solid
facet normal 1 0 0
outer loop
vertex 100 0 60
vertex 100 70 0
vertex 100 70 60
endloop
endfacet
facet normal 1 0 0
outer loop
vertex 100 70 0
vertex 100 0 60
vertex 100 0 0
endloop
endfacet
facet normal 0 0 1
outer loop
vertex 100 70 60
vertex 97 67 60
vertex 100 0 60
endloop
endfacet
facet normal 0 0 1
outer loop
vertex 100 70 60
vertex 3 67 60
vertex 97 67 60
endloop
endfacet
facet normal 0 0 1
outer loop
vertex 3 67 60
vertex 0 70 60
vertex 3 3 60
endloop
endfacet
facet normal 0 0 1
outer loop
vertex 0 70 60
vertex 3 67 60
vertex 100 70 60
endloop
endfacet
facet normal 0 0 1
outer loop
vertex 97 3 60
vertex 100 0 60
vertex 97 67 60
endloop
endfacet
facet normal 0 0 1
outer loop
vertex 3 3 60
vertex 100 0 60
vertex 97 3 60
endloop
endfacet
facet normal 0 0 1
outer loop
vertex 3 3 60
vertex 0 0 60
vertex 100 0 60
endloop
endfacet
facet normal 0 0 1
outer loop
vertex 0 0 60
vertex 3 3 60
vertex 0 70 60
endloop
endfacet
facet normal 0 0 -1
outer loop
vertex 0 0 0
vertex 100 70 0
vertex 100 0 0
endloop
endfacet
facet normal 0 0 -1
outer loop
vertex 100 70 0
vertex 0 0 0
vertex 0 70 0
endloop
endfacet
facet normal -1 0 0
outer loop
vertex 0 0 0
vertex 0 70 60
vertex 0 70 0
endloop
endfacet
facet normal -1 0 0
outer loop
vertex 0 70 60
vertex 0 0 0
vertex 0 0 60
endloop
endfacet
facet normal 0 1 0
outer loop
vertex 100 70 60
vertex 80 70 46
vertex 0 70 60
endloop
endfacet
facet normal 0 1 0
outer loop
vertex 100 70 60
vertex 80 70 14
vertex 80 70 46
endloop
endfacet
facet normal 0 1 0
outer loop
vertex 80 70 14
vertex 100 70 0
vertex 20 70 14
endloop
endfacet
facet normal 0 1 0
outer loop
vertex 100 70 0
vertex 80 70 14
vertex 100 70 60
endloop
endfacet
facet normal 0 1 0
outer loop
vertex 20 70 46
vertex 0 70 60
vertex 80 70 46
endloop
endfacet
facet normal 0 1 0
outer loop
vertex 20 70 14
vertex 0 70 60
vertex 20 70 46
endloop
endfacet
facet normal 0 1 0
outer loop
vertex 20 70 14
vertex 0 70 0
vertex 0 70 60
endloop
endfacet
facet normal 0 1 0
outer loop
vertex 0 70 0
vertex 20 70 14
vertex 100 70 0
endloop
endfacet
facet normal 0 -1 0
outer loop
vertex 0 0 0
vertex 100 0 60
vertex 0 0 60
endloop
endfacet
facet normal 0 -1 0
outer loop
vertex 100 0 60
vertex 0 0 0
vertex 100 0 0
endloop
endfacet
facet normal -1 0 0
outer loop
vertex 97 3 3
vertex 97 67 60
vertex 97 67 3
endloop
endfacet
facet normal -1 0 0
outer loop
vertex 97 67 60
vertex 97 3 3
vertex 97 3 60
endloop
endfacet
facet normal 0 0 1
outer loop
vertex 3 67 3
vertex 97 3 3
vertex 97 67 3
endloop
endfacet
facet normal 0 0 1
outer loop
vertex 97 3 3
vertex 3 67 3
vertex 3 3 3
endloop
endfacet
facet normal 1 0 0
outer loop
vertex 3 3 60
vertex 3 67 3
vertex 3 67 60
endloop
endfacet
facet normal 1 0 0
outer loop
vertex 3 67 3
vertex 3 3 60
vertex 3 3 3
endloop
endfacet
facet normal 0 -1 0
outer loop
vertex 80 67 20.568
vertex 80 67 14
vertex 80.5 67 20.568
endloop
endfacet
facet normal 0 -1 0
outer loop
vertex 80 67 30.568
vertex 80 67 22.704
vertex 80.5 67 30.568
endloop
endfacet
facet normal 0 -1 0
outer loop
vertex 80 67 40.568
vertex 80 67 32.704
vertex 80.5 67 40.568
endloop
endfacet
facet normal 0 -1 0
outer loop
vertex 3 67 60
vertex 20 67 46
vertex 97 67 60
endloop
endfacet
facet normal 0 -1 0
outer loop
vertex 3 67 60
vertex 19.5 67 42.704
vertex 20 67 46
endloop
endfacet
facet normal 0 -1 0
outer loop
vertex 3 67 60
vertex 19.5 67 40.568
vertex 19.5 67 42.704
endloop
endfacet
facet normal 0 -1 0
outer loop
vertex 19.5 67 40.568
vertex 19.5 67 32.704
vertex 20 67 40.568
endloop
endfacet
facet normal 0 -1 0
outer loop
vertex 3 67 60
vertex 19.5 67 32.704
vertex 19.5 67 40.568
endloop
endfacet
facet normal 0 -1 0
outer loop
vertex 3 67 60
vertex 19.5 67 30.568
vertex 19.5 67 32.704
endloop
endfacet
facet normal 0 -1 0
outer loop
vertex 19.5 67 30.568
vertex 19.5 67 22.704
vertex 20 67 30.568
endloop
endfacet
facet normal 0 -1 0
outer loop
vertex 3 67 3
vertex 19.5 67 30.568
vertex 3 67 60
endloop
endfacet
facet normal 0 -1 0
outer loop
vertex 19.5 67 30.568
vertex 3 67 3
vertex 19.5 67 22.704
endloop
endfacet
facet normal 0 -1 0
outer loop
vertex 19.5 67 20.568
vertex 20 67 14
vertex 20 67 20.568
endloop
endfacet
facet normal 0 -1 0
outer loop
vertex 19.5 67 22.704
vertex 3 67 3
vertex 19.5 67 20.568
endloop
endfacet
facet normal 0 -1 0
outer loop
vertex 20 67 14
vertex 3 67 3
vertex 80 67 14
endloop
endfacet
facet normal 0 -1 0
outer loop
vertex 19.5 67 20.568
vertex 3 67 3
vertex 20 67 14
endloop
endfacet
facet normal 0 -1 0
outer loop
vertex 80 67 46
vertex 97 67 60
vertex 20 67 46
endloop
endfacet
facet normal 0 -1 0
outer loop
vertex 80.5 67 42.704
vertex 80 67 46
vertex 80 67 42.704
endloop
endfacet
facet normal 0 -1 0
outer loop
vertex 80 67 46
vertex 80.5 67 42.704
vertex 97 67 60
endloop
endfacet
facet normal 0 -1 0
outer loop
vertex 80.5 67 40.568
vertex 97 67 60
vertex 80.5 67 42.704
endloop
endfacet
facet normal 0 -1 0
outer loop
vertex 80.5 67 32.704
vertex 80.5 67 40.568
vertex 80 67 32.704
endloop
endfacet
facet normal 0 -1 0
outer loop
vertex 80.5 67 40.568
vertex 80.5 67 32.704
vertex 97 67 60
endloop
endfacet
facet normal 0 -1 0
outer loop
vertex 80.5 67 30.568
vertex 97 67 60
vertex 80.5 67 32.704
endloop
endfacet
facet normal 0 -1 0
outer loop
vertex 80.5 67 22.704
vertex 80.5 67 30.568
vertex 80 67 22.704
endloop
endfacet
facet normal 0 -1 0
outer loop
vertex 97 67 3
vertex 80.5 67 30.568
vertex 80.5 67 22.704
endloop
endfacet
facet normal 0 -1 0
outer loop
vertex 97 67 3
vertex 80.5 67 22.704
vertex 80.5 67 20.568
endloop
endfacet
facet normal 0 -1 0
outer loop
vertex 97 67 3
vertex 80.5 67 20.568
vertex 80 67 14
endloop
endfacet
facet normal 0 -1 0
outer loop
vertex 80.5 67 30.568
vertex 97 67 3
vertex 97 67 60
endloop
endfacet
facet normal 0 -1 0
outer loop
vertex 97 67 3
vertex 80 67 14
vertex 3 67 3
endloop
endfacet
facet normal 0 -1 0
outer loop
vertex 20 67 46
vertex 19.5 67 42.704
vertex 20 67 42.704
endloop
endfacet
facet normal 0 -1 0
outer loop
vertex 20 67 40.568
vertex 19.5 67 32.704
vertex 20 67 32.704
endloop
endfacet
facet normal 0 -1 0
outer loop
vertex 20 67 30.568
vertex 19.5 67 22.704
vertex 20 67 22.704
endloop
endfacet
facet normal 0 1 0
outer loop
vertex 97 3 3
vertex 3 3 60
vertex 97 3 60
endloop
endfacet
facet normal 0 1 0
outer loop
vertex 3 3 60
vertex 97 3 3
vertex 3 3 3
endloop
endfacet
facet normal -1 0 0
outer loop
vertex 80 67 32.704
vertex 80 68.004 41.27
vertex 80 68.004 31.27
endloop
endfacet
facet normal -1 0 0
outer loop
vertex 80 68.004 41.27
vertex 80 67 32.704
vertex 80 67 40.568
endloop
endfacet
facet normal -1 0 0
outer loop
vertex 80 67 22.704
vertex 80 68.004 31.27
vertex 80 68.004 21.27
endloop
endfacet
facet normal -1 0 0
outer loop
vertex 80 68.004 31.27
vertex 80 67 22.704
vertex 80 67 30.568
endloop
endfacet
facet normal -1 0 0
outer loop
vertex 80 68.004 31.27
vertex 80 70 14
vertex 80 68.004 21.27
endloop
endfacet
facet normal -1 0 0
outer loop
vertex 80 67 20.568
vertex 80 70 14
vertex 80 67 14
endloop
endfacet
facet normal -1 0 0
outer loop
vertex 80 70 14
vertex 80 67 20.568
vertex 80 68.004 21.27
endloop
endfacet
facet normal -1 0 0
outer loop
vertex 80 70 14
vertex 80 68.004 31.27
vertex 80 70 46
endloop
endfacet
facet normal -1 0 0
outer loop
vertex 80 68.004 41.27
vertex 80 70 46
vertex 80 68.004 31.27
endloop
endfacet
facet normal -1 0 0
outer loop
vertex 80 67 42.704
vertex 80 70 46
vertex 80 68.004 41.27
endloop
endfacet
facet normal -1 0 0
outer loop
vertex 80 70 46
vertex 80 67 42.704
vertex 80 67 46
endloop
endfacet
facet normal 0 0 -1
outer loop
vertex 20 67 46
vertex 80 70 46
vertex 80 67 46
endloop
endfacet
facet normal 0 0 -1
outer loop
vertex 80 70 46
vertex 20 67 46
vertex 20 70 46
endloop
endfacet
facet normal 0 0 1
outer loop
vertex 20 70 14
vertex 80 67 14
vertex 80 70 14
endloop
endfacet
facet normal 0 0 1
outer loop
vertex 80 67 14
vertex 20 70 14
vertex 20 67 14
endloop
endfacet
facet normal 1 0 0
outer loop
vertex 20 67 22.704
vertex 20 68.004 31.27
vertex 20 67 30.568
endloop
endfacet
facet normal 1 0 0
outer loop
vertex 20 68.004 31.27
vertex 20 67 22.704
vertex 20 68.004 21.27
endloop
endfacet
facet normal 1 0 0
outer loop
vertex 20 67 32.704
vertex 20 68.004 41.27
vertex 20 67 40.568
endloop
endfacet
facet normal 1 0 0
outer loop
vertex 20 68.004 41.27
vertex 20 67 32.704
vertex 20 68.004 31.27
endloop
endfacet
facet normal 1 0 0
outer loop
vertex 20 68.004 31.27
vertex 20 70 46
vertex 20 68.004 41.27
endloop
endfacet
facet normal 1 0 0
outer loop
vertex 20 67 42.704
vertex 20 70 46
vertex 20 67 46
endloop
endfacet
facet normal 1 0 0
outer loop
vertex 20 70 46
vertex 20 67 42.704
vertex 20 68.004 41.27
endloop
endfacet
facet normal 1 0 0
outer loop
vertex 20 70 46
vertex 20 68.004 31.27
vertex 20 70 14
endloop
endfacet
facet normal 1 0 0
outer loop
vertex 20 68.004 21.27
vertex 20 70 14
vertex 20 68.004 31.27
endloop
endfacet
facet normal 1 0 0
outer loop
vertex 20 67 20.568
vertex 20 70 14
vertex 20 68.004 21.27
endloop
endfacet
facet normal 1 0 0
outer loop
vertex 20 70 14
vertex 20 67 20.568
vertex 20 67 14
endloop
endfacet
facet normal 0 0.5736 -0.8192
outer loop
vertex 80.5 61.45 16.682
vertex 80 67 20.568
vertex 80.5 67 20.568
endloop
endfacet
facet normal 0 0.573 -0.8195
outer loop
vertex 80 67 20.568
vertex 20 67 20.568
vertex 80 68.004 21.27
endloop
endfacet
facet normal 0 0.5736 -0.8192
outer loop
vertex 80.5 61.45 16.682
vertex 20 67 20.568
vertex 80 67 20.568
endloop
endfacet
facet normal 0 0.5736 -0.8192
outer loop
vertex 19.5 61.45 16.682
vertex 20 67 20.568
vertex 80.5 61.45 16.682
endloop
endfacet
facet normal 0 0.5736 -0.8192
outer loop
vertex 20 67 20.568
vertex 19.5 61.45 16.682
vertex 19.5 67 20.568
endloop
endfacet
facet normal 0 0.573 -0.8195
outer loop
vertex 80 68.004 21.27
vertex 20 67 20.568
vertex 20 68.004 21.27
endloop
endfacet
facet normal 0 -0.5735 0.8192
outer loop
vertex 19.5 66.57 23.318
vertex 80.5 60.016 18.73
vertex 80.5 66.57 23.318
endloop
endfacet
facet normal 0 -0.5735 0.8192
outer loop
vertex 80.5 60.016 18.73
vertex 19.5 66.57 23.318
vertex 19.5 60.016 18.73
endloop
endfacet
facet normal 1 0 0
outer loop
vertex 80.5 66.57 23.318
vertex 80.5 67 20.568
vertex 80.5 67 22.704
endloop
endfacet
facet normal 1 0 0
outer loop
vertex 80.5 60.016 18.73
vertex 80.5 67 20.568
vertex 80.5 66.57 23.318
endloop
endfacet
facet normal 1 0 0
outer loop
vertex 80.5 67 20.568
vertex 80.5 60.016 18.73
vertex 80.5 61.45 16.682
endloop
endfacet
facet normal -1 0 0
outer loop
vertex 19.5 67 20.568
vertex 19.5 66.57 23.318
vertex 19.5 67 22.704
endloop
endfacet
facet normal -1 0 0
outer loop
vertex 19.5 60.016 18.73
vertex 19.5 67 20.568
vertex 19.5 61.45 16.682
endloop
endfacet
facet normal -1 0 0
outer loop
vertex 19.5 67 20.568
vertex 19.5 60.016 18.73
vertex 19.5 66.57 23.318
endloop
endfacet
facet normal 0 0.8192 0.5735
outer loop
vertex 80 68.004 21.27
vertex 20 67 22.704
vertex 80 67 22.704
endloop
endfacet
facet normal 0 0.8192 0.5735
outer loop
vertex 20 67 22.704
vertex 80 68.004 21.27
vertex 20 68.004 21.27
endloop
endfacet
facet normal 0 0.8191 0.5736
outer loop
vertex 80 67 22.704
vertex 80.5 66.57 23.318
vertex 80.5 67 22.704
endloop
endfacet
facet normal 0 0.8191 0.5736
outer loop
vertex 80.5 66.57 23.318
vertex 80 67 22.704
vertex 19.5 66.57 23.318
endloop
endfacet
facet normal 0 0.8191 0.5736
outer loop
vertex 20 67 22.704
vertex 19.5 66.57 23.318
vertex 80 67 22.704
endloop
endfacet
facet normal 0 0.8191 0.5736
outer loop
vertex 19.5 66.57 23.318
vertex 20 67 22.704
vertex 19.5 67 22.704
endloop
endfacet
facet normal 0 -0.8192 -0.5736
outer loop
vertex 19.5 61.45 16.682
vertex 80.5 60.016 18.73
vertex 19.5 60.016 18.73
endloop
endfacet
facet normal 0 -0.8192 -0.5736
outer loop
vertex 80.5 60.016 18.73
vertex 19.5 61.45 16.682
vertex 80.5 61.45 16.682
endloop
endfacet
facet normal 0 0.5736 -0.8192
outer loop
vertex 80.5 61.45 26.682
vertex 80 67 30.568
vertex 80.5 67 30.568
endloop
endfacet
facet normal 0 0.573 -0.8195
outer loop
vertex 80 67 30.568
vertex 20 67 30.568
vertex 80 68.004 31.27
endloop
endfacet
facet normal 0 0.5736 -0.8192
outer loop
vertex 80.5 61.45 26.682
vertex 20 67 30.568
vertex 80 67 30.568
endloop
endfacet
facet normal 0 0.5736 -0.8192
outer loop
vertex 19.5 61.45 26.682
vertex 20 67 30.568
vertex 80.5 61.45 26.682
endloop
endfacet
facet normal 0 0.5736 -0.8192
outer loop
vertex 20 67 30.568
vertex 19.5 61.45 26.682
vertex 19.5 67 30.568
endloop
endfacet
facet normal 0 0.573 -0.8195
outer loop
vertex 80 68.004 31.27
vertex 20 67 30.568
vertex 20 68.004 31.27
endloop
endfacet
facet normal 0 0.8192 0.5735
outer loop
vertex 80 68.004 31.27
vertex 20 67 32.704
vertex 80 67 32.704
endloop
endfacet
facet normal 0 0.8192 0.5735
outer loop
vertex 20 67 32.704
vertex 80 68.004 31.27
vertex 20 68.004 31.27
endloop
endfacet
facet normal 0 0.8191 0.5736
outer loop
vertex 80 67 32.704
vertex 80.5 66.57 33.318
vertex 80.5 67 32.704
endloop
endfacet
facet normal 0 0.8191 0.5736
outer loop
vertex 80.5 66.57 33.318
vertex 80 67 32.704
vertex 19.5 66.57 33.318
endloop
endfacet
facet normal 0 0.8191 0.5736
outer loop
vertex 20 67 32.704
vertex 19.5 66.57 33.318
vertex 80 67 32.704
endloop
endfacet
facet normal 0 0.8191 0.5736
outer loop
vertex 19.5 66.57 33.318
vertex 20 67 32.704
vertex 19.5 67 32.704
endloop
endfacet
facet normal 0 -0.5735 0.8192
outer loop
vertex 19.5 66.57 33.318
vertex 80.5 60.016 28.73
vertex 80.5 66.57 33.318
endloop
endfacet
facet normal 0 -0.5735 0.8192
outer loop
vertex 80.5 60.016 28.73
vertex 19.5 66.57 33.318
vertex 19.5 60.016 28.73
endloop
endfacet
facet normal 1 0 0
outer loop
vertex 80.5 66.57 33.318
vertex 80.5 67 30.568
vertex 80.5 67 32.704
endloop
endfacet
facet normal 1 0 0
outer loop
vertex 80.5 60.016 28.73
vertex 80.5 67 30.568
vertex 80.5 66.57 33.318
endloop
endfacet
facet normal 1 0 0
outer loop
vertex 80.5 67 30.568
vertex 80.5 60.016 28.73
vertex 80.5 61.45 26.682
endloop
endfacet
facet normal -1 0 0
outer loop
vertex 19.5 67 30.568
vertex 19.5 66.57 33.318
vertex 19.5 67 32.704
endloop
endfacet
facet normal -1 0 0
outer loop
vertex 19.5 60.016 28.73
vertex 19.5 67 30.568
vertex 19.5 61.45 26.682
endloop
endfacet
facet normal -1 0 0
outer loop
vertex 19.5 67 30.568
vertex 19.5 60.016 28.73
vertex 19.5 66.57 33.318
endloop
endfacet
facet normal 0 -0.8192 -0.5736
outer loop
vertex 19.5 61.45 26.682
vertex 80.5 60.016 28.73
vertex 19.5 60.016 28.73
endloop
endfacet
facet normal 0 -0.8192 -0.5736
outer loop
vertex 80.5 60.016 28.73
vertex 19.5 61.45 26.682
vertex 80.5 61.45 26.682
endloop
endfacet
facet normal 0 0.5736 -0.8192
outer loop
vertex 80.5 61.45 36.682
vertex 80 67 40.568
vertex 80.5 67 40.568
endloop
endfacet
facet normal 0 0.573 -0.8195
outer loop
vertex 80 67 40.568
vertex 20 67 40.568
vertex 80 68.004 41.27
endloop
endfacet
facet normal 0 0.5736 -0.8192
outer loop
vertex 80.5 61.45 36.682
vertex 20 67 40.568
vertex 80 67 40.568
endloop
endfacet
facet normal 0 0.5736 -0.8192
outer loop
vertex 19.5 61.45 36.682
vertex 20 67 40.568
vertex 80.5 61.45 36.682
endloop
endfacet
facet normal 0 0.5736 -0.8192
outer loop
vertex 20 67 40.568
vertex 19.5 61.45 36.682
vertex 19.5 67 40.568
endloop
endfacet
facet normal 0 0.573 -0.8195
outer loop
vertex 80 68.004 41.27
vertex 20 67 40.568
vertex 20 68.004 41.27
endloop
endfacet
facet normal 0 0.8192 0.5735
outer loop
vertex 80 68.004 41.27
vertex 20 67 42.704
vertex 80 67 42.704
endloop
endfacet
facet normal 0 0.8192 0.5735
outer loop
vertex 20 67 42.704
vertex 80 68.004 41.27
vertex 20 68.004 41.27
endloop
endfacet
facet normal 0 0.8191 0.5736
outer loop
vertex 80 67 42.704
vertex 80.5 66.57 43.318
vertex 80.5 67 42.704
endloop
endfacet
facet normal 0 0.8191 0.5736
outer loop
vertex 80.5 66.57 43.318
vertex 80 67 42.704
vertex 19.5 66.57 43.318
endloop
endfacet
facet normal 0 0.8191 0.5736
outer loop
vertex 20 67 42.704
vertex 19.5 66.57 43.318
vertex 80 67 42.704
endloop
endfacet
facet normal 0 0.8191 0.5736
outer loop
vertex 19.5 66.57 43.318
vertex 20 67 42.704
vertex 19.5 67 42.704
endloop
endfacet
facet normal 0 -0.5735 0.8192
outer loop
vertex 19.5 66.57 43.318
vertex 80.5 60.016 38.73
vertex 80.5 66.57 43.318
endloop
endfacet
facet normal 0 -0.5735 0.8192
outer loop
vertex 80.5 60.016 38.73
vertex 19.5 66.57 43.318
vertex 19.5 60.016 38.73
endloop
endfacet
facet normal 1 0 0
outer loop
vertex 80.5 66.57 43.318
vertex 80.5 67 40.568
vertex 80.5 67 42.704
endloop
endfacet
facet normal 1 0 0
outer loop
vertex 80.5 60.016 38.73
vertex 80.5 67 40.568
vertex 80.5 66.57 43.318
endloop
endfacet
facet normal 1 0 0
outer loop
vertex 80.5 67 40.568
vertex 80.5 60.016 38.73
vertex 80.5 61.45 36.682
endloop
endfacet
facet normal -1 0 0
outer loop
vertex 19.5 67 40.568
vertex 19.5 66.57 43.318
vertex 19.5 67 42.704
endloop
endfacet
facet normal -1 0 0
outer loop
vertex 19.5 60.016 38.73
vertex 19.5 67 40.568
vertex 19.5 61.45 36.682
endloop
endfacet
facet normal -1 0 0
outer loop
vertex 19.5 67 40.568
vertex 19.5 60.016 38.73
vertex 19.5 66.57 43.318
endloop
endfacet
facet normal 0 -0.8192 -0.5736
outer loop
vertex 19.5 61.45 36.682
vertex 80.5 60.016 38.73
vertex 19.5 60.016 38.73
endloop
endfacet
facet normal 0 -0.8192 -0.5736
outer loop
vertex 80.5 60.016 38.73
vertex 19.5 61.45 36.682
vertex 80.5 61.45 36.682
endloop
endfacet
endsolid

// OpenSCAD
$fn = 32;

// ----------------------------------------------------------------------
// Vent box: louvers enclosure
// ----------------------------------------------------------------------

// --- parameters (mm) ---
box_l = 100;              // box length, X
box_w = 70;               // box width, Y
box_h = 60;               // box height, Z
wall_t = 3;               // shell wall thickness
win_l = 60;               // vent window width, X
win_h = 32;               // vent window height, Z
slat_t = 2.5;             // louver slat thickness
slat_d = 8;               // louver slat depth
slat_a = 35;              // louver slat angle, degrees
slat_pitch = 10;          // louver pitch
slat_yc = 64.01;          // slat centreline Y
fit_tol = 0.05;           // tolerance for press fits, mm
free_tol = 0.3;           // tolerance for clearance fits, mm

win_z0 = (box_h - win_h) / 2;  // window lower edge Z
n_slats = 3;  // louver count
slat_z0 = win_z0 + (win_h - (n_slats - 1) * slat_pitch) / 2;

difference() {
  union() {
    difference() {
      cube([box_l, box_w, box_h]);
  translate([wall_t, wall_t, wall_t])
    cube([box_l - 2 * wall_t, box_w - 2 * wall_t, box_h]);
  translate([(box_l - win_l) / 2, box_w - wall_t - 1, win_z0])
    cube([win_l, wall_t + 2, win_h]);
    }
    for (i = [0 : n_slats - 1])
      translate([box_l / 2, slat_yc, slat_z0 + i * slat_pitch])
        rotate([slat_a, 0, 0])
          cube([win_l + 1, slat_d, slat_t], center = true);
  }
}
